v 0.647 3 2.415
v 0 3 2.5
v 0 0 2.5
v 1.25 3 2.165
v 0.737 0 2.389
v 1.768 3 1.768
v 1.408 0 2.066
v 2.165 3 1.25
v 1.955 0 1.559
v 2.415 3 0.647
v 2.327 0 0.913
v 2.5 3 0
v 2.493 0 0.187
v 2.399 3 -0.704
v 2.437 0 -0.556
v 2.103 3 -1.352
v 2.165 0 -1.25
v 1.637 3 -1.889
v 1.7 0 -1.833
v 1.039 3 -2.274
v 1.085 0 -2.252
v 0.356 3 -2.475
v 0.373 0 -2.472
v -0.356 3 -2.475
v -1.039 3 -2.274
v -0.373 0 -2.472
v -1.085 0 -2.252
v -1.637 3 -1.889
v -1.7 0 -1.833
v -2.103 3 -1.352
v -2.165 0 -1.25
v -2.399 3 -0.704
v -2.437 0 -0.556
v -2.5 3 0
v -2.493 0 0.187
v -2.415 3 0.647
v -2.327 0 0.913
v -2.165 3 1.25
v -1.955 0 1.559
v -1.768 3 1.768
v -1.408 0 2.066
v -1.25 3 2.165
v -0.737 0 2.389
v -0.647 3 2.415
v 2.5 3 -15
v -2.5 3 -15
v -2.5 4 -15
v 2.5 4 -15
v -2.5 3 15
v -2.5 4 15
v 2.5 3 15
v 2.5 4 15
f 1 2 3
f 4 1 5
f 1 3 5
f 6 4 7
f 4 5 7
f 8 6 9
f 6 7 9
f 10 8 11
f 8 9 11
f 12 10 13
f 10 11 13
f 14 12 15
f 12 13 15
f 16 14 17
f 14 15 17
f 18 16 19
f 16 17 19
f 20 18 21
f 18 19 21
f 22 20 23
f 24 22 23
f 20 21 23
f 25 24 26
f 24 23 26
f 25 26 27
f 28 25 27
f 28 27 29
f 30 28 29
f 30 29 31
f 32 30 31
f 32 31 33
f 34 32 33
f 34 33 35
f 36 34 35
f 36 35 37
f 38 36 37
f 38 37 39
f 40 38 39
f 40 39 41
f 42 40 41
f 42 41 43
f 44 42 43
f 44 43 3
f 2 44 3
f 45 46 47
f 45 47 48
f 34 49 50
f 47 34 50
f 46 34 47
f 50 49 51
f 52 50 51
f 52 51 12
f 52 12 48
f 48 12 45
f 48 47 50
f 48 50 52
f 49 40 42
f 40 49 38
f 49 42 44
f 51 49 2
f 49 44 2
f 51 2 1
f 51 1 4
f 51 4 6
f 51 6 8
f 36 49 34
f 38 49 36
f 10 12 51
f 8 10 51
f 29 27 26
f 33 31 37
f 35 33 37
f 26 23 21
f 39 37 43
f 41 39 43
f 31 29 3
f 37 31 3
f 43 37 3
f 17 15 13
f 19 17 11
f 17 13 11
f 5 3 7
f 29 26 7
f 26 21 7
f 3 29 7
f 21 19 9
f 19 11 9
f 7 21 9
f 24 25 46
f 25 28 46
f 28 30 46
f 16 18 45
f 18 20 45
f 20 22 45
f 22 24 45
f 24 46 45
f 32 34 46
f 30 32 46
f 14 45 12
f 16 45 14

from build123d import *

# Parameters (mm, degrees)
ESQUISSE1_R        = 2.5
BOSS_EXTRU_1_DEPTH = 3
ESQUISSE2_W        = 5
ESQUISSE2_H        = 30
BOSS_EXTRU_2_DEPTH = 1


with BuildPart() as part:
    # Esquisse1 → Boss.-Extru.1 (new body)
    with BuildSketch(Plane(origin=(0, 0, 0), x_dir=(1, 0, 0), z_dir=(0, 1, 0))):
        with Locations(Location((0, 0, 0), (0, 0, 270))):
            Circle(ESQUISSE1_R)
    extrude(amount=BOSS_EXTRU_1_DEPTH)

    # Esquisse2 → Boss.-Extru.2 (add)
    with BuildSketch(Plane(origin=(0, 3, 0), x_dir=(1, 0, 0), z_dir=(0, 1, 0))):
        Rectangle(ESQUISSE2_W, ESQUISSE2_H)
    extrude(amount=BOSS_EXTRU_2_DEPTH)


solid = part.part
